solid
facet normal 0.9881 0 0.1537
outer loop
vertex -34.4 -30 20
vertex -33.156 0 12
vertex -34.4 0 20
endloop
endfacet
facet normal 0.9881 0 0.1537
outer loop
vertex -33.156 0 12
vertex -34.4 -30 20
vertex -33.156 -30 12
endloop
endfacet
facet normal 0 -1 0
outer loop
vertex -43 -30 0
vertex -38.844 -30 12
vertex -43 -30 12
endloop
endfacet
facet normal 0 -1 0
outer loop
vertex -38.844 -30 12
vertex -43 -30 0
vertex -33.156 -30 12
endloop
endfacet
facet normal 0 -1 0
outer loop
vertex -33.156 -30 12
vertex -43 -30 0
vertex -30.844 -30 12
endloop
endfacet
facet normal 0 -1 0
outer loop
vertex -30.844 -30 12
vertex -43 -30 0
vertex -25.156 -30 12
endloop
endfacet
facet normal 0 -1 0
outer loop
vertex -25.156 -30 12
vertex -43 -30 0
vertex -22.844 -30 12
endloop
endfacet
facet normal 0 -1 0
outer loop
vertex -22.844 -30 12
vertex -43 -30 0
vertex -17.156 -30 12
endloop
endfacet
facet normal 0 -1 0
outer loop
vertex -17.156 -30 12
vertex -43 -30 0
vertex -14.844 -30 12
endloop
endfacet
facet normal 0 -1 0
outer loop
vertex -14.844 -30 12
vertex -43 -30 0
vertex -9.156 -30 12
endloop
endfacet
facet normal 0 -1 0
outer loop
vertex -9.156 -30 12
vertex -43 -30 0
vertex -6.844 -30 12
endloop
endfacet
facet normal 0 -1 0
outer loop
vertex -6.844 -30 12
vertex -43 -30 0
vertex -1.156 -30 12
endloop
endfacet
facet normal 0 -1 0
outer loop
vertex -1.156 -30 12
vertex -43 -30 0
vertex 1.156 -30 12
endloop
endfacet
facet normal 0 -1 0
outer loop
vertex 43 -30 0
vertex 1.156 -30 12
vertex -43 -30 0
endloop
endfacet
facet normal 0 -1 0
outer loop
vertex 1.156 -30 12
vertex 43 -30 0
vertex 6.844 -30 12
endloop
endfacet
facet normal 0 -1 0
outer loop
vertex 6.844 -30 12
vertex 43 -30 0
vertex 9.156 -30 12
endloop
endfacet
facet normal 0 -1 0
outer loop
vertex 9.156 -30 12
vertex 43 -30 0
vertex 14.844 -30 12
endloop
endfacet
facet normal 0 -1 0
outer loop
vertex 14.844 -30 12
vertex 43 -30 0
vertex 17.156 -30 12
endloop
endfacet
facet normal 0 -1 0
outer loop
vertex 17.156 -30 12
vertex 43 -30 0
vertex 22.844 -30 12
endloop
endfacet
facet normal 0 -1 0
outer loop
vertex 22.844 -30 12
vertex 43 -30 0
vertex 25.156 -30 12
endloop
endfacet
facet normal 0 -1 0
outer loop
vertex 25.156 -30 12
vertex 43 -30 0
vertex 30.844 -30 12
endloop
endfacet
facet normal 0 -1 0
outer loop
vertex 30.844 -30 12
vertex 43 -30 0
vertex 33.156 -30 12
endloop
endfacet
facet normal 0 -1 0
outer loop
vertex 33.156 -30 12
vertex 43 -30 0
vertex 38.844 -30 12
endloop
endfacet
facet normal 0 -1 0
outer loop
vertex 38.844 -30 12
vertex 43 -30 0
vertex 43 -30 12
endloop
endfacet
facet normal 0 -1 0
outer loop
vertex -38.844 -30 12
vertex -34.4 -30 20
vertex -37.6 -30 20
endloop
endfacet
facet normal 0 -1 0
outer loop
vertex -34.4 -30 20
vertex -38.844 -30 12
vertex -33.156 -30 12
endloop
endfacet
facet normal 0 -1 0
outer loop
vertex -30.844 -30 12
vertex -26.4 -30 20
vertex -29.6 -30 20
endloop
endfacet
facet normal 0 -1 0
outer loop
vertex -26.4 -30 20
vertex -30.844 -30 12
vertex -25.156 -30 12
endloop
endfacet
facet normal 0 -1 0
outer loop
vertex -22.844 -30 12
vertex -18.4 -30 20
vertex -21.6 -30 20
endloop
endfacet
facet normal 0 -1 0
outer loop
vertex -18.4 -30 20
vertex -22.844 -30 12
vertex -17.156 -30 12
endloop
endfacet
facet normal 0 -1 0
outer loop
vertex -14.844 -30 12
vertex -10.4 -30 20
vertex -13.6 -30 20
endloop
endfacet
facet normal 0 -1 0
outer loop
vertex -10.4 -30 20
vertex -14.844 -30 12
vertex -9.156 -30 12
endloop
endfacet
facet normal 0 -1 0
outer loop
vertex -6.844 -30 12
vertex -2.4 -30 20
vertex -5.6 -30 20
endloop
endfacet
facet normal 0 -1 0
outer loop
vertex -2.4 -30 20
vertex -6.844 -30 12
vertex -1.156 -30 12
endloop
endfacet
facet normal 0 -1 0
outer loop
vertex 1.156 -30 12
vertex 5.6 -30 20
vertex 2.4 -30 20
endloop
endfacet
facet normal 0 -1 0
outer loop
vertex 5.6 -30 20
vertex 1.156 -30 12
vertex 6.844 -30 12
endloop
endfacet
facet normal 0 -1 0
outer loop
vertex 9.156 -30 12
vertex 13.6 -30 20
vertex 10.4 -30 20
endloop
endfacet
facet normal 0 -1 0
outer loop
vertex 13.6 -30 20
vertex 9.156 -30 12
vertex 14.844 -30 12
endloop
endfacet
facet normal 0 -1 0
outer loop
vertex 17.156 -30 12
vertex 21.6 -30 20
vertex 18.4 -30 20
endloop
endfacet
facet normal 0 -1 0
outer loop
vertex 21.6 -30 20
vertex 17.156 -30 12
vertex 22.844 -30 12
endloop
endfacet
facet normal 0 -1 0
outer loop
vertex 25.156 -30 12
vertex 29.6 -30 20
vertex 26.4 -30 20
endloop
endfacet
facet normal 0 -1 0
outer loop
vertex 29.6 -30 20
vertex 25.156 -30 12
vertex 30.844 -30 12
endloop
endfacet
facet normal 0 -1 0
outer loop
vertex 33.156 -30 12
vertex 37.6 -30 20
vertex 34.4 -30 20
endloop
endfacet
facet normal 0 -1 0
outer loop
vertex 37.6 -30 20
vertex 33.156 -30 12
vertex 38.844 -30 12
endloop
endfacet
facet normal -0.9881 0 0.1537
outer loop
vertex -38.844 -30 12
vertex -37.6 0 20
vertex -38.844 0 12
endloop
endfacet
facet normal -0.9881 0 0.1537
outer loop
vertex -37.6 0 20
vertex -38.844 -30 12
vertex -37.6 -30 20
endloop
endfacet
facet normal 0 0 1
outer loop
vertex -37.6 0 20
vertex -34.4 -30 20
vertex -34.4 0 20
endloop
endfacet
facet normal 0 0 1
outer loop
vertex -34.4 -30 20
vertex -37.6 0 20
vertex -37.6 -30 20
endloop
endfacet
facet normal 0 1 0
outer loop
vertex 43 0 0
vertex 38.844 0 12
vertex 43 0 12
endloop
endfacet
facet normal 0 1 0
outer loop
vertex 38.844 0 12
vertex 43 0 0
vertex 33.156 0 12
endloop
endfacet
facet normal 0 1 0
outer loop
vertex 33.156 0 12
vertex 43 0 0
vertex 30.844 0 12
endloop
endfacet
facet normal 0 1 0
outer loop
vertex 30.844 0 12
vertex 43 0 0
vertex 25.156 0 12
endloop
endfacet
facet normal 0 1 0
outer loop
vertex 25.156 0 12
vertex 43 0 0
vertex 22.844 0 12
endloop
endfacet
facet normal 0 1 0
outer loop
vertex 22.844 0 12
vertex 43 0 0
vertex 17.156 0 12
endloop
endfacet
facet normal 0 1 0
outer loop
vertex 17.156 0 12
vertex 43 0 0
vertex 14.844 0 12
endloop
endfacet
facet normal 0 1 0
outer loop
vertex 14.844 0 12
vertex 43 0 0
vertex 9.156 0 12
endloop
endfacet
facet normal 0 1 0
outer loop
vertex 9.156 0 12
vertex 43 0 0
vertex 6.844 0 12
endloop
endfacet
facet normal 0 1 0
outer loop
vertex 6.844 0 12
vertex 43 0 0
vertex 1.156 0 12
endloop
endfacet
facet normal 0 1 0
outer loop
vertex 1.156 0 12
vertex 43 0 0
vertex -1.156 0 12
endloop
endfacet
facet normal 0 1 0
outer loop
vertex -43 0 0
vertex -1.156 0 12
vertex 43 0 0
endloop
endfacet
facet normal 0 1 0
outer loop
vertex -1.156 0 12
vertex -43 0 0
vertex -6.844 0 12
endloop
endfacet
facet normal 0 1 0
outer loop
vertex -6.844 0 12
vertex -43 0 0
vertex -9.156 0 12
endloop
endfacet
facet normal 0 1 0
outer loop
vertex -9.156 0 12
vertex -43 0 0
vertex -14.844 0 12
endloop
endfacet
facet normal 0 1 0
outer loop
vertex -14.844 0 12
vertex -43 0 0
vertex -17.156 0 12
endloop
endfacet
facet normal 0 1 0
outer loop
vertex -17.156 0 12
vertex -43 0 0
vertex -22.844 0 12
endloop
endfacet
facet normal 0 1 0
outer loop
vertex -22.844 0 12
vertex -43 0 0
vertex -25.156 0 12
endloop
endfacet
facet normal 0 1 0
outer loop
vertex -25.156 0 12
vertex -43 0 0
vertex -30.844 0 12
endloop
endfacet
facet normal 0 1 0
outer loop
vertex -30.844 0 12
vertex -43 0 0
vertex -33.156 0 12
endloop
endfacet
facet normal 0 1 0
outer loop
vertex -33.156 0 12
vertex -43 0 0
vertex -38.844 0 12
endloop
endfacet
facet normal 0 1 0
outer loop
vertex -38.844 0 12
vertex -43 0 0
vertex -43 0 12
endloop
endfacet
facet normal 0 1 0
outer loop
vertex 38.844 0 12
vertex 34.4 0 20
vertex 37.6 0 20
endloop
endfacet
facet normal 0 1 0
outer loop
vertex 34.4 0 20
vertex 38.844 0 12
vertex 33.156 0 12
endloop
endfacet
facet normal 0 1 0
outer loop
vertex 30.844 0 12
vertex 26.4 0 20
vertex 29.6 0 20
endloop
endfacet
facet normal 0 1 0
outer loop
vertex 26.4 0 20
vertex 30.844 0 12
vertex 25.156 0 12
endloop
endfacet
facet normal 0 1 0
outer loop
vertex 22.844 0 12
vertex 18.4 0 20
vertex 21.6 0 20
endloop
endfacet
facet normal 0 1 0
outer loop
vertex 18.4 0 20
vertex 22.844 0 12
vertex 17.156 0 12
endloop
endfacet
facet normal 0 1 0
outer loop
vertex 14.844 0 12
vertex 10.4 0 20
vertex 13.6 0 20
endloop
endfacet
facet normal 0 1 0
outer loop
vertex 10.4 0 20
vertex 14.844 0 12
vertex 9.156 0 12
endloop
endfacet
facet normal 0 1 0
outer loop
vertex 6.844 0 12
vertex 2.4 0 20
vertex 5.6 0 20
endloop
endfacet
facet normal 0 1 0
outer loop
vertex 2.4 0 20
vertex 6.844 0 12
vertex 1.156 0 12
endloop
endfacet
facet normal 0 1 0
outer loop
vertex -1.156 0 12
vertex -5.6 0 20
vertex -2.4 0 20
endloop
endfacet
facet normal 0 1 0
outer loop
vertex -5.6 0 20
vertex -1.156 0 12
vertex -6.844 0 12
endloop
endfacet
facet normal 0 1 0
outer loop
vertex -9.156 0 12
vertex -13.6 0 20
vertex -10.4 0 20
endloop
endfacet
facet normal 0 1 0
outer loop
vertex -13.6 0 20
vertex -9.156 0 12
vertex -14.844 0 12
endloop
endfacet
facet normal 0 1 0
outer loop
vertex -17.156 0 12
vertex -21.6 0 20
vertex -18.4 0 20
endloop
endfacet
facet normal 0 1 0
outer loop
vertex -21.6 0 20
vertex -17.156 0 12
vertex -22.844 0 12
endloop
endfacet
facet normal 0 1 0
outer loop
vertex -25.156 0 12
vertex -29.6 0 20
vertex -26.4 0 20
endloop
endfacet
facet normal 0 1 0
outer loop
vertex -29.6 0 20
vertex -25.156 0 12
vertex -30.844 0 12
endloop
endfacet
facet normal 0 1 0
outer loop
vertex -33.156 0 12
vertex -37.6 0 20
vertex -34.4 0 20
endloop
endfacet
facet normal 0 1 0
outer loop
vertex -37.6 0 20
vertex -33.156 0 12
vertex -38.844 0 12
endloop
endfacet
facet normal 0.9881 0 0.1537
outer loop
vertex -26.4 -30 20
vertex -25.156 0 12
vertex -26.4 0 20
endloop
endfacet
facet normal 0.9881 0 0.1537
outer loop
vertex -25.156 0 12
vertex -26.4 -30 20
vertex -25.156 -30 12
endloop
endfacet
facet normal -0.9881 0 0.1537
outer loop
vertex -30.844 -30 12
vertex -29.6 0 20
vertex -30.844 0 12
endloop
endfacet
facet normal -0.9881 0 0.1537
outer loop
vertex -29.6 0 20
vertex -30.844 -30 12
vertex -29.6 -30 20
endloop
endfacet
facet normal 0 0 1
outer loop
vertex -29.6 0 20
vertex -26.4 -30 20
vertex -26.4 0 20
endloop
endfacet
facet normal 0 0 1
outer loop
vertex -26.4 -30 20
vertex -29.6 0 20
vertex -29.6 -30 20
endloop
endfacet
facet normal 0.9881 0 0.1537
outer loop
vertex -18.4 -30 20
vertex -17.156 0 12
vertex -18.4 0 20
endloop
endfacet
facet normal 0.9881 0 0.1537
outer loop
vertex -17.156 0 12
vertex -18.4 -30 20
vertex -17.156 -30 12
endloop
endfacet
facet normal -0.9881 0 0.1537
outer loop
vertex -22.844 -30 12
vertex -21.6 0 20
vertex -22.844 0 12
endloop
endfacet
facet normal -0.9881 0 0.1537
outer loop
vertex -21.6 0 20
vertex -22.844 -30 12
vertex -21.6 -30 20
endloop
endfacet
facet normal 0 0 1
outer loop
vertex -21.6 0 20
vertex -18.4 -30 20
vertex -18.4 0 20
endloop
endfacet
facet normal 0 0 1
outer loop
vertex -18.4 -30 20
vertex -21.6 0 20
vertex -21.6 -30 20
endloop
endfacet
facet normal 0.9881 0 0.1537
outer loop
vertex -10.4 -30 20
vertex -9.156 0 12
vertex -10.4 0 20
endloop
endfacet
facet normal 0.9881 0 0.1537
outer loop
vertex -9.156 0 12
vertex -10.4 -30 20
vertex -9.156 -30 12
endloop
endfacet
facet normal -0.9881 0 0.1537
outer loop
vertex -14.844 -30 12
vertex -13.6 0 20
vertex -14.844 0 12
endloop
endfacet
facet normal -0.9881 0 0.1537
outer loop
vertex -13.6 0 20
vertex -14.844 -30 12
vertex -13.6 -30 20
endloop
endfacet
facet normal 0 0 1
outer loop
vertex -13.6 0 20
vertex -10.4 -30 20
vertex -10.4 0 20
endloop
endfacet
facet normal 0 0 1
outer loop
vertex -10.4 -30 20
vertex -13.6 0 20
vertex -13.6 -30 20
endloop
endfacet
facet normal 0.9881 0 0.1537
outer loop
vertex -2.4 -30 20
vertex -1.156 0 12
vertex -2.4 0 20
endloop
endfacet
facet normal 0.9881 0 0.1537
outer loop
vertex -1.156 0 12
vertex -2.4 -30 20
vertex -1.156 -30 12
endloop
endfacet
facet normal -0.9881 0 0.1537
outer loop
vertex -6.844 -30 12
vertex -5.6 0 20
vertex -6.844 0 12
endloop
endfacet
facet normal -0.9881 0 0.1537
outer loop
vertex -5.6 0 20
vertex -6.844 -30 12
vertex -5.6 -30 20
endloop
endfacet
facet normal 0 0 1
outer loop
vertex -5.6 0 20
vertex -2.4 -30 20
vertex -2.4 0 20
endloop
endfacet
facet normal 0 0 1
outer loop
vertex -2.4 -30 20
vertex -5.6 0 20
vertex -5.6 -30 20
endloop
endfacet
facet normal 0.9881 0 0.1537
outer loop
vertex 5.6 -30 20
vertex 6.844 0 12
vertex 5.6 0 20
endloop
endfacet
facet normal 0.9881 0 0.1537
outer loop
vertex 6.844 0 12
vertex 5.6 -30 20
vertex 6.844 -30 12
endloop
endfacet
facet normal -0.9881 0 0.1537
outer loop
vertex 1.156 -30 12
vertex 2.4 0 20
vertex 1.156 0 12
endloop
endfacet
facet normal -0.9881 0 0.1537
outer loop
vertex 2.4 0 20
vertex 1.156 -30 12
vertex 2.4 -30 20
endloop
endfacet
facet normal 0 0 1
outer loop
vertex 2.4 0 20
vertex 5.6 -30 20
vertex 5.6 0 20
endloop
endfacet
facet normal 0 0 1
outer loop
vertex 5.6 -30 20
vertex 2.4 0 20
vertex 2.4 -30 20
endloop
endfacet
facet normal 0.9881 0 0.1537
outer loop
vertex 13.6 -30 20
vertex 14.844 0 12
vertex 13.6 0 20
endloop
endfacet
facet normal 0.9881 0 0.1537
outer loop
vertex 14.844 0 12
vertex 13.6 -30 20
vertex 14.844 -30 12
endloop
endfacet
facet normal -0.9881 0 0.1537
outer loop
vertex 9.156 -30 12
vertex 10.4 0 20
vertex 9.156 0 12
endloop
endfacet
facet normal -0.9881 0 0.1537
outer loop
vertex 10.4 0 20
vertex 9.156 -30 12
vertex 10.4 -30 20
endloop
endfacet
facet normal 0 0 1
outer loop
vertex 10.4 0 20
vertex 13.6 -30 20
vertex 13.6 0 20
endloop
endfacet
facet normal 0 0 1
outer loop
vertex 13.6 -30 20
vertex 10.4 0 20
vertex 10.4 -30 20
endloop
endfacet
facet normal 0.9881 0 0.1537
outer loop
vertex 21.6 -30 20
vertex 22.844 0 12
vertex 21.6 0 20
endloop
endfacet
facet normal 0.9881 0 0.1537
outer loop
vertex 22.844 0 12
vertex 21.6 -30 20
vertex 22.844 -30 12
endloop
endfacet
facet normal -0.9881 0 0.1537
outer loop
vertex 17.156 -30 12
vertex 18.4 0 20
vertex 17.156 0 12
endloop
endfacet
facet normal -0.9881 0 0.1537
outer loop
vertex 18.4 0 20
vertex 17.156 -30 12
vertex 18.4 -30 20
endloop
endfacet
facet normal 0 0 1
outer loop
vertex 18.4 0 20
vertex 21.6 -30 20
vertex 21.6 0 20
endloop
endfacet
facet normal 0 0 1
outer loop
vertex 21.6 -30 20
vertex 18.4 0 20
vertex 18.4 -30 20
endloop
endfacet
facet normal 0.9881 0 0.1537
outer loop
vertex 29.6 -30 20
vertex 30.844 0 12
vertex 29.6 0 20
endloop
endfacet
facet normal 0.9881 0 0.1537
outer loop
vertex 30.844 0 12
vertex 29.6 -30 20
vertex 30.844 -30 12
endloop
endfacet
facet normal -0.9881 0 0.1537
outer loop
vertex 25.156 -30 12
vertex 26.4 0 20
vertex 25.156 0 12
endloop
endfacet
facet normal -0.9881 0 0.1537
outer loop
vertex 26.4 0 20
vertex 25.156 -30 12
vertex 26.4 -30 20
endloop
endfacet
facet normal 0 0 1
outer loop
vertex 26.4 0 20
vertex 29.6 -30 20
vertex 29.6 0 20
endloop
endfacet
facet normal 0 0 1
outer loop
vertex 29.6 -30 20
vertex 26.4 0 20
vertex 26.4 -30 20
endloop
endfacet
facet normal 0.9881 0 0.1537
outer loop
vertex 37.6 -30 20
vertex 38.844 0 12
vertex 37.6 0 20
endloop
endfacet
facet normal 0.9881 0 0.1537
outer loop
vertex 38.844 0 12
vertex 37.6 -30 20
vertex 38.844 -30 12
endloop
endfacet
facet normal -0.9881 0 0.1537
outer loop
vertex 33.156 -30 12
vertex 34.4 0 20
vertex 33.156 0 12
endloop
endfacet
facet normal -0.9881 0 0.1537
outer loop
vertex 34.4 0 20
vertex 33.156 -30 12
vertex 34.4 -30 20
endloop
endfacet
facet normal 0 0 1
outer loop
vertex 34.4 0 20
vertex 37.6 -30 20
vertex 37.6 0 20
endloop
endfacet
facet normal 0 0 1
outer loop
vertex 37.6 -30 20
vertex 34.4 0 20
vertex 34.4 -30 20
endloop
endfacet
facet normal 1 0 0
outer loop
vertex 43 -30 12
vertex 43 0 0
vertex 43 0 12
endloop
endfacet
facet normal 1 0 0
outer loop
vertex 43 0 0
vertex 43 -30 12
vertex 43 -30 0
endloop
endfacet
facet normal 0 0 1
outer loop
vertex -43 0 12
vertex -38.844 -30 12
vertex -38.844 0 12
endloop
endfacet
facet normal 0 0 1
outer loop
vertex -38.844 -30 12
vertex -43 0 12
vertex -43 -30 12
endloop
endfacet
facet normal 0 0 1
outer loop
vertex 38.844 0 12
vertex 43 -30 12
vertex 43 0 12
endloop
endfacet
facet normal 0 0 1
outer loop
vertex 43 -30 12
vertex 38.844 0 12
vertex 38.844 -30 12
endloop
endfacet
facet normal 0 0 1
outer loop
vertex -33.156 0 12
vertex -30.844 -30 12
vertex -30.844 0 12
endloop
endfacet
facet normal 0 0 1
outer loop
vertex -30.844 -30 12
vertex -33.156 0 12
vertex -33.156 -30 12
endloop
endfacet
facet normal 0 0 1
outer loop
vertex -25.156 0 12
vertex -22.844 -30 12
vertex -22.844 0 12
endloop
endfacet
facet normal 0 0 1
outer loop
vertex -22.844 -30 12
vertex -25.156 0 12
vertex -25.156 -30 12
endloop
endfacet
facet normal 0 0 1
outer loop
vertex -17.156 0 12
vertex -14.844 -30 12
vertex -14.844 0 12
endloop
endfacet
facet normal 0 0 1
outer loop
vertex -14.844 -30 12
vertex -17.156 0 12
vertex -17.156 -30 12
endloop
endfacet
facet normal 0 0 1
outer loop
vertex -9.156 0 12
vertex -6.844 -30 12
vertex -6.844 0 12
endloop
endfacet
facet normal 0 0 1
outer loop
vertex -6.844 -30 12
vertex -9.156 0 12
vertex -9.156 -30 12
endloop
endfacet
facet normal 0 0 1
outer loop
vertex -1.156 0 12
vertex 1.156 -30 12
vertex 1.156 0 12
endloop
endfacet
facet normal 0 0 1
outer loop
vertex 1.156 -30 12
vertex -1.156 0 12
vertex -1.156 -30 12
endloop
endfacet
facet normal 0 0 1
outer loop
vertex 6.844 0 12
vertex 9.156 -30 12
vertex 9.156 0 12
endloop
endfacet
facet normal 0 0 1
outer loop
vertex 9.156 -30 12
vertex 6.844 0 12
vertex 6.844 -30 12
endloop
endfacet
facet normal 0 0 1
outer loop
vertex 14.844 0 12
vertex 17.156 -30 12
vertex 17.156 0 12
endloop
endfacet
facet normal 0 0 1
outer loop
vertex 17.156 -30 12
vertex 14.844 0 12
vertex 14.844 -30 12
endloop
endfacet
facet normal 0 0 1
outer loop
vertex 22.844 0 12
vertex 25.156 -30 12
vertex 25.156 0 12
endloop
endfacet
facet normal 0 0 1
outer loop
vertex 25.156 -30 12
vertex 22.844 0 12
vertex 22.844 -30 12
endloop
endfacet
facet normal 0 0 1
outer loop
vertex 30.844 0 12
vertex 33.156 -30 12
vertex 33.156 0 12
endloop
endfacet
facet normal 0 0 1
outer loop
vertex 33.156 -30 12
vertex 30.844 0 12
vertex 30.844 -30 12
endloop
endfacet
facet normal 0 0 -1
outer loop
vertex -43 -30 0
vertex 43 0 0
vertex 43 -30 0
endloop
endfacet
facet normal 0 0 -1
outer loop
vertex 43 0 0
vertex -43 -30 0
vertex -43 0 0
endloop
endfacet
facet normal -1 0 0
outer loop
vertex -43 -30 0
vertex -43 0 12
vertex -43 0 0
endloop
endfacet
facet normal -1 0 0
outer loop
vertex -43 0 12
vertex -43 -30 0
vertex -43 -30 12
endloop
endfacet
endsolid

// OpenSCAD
$fn = 32;

// ----------------------------------------------------------------------
// Toothed rack, 10 teeth
// 8 mm pitch, 8 mm teeth
// ----------------------------------------------------------------------

// --- parameters (mm) ---
bar_w = 30;     // bar width (Y)
bar_h = 12;     // bar height (Z)
teeth = 10;     // number of teeth
pitch = 8;      // tooth pitch
tooth_h = 8;    // tooth height above the bar
root_w = 6;     // tooth width at the root
crest_w = 3.2;  // tooth width at the crest

// --- derived feature positions (mm) ---
span = (teeth - 1) * pitch;  // = 72   distance between the outer teeth
bar_l = span + root_w + 8;   // = 86   bar length: teeth plus 4 mm at each end
tooth_x = -span / 2;         // = -36   X of the first tooth
height = bar_h + tooth_h;    // = 20   overall height
feature_centers = [
  [tooth_x + 0 * pitch, -bar_w / 2],
  [tooth_x + 1 * pitch, -bar_w / 2],
  [tooth_x + 2 * pitch, -bar_w / 2],
  [tooth_x + 3 * pitch, -bar_w / 2],
  [tooth_x + 4 * pitch, -bar_w / 2],
  [tooth_x + 5 * pitch, -bar_w / 2],
  [tooth_x + 6 * pitch, -bar_w / 2],
  [tooth_x + 7 * pitch, -bar_w / 2],
  [tooth_x + 8 * pitch, -bar_w / 2],
  [tooth_x + 9 * pitch, -bar_w / 2]
];   // tooth centre line, drives the tooth loop

// bar with a rack of teeth, one extruded trapezoium per centre
module rack_tooth() {
  linear_extrude(height = bar_w)
    polygon(points = [
      [0, 0],
      [root_w, 0],
      [root_w / 2 + crest_w / 2, tooth_h + 1],
      [root_w / 2 - crest_w / 2, tooth_h + 1]
    ]);
}

union() {
  translate([-bar_l / 2, -bar_w, 0]) cube([bar_l, bar_w, bar_h]);
  for (centre = feature_centers)
    translate([centre[0] - root_w / 2, 0, bar_h - 1]) rotate([90, 0, 0]) rack_tooth();
}
